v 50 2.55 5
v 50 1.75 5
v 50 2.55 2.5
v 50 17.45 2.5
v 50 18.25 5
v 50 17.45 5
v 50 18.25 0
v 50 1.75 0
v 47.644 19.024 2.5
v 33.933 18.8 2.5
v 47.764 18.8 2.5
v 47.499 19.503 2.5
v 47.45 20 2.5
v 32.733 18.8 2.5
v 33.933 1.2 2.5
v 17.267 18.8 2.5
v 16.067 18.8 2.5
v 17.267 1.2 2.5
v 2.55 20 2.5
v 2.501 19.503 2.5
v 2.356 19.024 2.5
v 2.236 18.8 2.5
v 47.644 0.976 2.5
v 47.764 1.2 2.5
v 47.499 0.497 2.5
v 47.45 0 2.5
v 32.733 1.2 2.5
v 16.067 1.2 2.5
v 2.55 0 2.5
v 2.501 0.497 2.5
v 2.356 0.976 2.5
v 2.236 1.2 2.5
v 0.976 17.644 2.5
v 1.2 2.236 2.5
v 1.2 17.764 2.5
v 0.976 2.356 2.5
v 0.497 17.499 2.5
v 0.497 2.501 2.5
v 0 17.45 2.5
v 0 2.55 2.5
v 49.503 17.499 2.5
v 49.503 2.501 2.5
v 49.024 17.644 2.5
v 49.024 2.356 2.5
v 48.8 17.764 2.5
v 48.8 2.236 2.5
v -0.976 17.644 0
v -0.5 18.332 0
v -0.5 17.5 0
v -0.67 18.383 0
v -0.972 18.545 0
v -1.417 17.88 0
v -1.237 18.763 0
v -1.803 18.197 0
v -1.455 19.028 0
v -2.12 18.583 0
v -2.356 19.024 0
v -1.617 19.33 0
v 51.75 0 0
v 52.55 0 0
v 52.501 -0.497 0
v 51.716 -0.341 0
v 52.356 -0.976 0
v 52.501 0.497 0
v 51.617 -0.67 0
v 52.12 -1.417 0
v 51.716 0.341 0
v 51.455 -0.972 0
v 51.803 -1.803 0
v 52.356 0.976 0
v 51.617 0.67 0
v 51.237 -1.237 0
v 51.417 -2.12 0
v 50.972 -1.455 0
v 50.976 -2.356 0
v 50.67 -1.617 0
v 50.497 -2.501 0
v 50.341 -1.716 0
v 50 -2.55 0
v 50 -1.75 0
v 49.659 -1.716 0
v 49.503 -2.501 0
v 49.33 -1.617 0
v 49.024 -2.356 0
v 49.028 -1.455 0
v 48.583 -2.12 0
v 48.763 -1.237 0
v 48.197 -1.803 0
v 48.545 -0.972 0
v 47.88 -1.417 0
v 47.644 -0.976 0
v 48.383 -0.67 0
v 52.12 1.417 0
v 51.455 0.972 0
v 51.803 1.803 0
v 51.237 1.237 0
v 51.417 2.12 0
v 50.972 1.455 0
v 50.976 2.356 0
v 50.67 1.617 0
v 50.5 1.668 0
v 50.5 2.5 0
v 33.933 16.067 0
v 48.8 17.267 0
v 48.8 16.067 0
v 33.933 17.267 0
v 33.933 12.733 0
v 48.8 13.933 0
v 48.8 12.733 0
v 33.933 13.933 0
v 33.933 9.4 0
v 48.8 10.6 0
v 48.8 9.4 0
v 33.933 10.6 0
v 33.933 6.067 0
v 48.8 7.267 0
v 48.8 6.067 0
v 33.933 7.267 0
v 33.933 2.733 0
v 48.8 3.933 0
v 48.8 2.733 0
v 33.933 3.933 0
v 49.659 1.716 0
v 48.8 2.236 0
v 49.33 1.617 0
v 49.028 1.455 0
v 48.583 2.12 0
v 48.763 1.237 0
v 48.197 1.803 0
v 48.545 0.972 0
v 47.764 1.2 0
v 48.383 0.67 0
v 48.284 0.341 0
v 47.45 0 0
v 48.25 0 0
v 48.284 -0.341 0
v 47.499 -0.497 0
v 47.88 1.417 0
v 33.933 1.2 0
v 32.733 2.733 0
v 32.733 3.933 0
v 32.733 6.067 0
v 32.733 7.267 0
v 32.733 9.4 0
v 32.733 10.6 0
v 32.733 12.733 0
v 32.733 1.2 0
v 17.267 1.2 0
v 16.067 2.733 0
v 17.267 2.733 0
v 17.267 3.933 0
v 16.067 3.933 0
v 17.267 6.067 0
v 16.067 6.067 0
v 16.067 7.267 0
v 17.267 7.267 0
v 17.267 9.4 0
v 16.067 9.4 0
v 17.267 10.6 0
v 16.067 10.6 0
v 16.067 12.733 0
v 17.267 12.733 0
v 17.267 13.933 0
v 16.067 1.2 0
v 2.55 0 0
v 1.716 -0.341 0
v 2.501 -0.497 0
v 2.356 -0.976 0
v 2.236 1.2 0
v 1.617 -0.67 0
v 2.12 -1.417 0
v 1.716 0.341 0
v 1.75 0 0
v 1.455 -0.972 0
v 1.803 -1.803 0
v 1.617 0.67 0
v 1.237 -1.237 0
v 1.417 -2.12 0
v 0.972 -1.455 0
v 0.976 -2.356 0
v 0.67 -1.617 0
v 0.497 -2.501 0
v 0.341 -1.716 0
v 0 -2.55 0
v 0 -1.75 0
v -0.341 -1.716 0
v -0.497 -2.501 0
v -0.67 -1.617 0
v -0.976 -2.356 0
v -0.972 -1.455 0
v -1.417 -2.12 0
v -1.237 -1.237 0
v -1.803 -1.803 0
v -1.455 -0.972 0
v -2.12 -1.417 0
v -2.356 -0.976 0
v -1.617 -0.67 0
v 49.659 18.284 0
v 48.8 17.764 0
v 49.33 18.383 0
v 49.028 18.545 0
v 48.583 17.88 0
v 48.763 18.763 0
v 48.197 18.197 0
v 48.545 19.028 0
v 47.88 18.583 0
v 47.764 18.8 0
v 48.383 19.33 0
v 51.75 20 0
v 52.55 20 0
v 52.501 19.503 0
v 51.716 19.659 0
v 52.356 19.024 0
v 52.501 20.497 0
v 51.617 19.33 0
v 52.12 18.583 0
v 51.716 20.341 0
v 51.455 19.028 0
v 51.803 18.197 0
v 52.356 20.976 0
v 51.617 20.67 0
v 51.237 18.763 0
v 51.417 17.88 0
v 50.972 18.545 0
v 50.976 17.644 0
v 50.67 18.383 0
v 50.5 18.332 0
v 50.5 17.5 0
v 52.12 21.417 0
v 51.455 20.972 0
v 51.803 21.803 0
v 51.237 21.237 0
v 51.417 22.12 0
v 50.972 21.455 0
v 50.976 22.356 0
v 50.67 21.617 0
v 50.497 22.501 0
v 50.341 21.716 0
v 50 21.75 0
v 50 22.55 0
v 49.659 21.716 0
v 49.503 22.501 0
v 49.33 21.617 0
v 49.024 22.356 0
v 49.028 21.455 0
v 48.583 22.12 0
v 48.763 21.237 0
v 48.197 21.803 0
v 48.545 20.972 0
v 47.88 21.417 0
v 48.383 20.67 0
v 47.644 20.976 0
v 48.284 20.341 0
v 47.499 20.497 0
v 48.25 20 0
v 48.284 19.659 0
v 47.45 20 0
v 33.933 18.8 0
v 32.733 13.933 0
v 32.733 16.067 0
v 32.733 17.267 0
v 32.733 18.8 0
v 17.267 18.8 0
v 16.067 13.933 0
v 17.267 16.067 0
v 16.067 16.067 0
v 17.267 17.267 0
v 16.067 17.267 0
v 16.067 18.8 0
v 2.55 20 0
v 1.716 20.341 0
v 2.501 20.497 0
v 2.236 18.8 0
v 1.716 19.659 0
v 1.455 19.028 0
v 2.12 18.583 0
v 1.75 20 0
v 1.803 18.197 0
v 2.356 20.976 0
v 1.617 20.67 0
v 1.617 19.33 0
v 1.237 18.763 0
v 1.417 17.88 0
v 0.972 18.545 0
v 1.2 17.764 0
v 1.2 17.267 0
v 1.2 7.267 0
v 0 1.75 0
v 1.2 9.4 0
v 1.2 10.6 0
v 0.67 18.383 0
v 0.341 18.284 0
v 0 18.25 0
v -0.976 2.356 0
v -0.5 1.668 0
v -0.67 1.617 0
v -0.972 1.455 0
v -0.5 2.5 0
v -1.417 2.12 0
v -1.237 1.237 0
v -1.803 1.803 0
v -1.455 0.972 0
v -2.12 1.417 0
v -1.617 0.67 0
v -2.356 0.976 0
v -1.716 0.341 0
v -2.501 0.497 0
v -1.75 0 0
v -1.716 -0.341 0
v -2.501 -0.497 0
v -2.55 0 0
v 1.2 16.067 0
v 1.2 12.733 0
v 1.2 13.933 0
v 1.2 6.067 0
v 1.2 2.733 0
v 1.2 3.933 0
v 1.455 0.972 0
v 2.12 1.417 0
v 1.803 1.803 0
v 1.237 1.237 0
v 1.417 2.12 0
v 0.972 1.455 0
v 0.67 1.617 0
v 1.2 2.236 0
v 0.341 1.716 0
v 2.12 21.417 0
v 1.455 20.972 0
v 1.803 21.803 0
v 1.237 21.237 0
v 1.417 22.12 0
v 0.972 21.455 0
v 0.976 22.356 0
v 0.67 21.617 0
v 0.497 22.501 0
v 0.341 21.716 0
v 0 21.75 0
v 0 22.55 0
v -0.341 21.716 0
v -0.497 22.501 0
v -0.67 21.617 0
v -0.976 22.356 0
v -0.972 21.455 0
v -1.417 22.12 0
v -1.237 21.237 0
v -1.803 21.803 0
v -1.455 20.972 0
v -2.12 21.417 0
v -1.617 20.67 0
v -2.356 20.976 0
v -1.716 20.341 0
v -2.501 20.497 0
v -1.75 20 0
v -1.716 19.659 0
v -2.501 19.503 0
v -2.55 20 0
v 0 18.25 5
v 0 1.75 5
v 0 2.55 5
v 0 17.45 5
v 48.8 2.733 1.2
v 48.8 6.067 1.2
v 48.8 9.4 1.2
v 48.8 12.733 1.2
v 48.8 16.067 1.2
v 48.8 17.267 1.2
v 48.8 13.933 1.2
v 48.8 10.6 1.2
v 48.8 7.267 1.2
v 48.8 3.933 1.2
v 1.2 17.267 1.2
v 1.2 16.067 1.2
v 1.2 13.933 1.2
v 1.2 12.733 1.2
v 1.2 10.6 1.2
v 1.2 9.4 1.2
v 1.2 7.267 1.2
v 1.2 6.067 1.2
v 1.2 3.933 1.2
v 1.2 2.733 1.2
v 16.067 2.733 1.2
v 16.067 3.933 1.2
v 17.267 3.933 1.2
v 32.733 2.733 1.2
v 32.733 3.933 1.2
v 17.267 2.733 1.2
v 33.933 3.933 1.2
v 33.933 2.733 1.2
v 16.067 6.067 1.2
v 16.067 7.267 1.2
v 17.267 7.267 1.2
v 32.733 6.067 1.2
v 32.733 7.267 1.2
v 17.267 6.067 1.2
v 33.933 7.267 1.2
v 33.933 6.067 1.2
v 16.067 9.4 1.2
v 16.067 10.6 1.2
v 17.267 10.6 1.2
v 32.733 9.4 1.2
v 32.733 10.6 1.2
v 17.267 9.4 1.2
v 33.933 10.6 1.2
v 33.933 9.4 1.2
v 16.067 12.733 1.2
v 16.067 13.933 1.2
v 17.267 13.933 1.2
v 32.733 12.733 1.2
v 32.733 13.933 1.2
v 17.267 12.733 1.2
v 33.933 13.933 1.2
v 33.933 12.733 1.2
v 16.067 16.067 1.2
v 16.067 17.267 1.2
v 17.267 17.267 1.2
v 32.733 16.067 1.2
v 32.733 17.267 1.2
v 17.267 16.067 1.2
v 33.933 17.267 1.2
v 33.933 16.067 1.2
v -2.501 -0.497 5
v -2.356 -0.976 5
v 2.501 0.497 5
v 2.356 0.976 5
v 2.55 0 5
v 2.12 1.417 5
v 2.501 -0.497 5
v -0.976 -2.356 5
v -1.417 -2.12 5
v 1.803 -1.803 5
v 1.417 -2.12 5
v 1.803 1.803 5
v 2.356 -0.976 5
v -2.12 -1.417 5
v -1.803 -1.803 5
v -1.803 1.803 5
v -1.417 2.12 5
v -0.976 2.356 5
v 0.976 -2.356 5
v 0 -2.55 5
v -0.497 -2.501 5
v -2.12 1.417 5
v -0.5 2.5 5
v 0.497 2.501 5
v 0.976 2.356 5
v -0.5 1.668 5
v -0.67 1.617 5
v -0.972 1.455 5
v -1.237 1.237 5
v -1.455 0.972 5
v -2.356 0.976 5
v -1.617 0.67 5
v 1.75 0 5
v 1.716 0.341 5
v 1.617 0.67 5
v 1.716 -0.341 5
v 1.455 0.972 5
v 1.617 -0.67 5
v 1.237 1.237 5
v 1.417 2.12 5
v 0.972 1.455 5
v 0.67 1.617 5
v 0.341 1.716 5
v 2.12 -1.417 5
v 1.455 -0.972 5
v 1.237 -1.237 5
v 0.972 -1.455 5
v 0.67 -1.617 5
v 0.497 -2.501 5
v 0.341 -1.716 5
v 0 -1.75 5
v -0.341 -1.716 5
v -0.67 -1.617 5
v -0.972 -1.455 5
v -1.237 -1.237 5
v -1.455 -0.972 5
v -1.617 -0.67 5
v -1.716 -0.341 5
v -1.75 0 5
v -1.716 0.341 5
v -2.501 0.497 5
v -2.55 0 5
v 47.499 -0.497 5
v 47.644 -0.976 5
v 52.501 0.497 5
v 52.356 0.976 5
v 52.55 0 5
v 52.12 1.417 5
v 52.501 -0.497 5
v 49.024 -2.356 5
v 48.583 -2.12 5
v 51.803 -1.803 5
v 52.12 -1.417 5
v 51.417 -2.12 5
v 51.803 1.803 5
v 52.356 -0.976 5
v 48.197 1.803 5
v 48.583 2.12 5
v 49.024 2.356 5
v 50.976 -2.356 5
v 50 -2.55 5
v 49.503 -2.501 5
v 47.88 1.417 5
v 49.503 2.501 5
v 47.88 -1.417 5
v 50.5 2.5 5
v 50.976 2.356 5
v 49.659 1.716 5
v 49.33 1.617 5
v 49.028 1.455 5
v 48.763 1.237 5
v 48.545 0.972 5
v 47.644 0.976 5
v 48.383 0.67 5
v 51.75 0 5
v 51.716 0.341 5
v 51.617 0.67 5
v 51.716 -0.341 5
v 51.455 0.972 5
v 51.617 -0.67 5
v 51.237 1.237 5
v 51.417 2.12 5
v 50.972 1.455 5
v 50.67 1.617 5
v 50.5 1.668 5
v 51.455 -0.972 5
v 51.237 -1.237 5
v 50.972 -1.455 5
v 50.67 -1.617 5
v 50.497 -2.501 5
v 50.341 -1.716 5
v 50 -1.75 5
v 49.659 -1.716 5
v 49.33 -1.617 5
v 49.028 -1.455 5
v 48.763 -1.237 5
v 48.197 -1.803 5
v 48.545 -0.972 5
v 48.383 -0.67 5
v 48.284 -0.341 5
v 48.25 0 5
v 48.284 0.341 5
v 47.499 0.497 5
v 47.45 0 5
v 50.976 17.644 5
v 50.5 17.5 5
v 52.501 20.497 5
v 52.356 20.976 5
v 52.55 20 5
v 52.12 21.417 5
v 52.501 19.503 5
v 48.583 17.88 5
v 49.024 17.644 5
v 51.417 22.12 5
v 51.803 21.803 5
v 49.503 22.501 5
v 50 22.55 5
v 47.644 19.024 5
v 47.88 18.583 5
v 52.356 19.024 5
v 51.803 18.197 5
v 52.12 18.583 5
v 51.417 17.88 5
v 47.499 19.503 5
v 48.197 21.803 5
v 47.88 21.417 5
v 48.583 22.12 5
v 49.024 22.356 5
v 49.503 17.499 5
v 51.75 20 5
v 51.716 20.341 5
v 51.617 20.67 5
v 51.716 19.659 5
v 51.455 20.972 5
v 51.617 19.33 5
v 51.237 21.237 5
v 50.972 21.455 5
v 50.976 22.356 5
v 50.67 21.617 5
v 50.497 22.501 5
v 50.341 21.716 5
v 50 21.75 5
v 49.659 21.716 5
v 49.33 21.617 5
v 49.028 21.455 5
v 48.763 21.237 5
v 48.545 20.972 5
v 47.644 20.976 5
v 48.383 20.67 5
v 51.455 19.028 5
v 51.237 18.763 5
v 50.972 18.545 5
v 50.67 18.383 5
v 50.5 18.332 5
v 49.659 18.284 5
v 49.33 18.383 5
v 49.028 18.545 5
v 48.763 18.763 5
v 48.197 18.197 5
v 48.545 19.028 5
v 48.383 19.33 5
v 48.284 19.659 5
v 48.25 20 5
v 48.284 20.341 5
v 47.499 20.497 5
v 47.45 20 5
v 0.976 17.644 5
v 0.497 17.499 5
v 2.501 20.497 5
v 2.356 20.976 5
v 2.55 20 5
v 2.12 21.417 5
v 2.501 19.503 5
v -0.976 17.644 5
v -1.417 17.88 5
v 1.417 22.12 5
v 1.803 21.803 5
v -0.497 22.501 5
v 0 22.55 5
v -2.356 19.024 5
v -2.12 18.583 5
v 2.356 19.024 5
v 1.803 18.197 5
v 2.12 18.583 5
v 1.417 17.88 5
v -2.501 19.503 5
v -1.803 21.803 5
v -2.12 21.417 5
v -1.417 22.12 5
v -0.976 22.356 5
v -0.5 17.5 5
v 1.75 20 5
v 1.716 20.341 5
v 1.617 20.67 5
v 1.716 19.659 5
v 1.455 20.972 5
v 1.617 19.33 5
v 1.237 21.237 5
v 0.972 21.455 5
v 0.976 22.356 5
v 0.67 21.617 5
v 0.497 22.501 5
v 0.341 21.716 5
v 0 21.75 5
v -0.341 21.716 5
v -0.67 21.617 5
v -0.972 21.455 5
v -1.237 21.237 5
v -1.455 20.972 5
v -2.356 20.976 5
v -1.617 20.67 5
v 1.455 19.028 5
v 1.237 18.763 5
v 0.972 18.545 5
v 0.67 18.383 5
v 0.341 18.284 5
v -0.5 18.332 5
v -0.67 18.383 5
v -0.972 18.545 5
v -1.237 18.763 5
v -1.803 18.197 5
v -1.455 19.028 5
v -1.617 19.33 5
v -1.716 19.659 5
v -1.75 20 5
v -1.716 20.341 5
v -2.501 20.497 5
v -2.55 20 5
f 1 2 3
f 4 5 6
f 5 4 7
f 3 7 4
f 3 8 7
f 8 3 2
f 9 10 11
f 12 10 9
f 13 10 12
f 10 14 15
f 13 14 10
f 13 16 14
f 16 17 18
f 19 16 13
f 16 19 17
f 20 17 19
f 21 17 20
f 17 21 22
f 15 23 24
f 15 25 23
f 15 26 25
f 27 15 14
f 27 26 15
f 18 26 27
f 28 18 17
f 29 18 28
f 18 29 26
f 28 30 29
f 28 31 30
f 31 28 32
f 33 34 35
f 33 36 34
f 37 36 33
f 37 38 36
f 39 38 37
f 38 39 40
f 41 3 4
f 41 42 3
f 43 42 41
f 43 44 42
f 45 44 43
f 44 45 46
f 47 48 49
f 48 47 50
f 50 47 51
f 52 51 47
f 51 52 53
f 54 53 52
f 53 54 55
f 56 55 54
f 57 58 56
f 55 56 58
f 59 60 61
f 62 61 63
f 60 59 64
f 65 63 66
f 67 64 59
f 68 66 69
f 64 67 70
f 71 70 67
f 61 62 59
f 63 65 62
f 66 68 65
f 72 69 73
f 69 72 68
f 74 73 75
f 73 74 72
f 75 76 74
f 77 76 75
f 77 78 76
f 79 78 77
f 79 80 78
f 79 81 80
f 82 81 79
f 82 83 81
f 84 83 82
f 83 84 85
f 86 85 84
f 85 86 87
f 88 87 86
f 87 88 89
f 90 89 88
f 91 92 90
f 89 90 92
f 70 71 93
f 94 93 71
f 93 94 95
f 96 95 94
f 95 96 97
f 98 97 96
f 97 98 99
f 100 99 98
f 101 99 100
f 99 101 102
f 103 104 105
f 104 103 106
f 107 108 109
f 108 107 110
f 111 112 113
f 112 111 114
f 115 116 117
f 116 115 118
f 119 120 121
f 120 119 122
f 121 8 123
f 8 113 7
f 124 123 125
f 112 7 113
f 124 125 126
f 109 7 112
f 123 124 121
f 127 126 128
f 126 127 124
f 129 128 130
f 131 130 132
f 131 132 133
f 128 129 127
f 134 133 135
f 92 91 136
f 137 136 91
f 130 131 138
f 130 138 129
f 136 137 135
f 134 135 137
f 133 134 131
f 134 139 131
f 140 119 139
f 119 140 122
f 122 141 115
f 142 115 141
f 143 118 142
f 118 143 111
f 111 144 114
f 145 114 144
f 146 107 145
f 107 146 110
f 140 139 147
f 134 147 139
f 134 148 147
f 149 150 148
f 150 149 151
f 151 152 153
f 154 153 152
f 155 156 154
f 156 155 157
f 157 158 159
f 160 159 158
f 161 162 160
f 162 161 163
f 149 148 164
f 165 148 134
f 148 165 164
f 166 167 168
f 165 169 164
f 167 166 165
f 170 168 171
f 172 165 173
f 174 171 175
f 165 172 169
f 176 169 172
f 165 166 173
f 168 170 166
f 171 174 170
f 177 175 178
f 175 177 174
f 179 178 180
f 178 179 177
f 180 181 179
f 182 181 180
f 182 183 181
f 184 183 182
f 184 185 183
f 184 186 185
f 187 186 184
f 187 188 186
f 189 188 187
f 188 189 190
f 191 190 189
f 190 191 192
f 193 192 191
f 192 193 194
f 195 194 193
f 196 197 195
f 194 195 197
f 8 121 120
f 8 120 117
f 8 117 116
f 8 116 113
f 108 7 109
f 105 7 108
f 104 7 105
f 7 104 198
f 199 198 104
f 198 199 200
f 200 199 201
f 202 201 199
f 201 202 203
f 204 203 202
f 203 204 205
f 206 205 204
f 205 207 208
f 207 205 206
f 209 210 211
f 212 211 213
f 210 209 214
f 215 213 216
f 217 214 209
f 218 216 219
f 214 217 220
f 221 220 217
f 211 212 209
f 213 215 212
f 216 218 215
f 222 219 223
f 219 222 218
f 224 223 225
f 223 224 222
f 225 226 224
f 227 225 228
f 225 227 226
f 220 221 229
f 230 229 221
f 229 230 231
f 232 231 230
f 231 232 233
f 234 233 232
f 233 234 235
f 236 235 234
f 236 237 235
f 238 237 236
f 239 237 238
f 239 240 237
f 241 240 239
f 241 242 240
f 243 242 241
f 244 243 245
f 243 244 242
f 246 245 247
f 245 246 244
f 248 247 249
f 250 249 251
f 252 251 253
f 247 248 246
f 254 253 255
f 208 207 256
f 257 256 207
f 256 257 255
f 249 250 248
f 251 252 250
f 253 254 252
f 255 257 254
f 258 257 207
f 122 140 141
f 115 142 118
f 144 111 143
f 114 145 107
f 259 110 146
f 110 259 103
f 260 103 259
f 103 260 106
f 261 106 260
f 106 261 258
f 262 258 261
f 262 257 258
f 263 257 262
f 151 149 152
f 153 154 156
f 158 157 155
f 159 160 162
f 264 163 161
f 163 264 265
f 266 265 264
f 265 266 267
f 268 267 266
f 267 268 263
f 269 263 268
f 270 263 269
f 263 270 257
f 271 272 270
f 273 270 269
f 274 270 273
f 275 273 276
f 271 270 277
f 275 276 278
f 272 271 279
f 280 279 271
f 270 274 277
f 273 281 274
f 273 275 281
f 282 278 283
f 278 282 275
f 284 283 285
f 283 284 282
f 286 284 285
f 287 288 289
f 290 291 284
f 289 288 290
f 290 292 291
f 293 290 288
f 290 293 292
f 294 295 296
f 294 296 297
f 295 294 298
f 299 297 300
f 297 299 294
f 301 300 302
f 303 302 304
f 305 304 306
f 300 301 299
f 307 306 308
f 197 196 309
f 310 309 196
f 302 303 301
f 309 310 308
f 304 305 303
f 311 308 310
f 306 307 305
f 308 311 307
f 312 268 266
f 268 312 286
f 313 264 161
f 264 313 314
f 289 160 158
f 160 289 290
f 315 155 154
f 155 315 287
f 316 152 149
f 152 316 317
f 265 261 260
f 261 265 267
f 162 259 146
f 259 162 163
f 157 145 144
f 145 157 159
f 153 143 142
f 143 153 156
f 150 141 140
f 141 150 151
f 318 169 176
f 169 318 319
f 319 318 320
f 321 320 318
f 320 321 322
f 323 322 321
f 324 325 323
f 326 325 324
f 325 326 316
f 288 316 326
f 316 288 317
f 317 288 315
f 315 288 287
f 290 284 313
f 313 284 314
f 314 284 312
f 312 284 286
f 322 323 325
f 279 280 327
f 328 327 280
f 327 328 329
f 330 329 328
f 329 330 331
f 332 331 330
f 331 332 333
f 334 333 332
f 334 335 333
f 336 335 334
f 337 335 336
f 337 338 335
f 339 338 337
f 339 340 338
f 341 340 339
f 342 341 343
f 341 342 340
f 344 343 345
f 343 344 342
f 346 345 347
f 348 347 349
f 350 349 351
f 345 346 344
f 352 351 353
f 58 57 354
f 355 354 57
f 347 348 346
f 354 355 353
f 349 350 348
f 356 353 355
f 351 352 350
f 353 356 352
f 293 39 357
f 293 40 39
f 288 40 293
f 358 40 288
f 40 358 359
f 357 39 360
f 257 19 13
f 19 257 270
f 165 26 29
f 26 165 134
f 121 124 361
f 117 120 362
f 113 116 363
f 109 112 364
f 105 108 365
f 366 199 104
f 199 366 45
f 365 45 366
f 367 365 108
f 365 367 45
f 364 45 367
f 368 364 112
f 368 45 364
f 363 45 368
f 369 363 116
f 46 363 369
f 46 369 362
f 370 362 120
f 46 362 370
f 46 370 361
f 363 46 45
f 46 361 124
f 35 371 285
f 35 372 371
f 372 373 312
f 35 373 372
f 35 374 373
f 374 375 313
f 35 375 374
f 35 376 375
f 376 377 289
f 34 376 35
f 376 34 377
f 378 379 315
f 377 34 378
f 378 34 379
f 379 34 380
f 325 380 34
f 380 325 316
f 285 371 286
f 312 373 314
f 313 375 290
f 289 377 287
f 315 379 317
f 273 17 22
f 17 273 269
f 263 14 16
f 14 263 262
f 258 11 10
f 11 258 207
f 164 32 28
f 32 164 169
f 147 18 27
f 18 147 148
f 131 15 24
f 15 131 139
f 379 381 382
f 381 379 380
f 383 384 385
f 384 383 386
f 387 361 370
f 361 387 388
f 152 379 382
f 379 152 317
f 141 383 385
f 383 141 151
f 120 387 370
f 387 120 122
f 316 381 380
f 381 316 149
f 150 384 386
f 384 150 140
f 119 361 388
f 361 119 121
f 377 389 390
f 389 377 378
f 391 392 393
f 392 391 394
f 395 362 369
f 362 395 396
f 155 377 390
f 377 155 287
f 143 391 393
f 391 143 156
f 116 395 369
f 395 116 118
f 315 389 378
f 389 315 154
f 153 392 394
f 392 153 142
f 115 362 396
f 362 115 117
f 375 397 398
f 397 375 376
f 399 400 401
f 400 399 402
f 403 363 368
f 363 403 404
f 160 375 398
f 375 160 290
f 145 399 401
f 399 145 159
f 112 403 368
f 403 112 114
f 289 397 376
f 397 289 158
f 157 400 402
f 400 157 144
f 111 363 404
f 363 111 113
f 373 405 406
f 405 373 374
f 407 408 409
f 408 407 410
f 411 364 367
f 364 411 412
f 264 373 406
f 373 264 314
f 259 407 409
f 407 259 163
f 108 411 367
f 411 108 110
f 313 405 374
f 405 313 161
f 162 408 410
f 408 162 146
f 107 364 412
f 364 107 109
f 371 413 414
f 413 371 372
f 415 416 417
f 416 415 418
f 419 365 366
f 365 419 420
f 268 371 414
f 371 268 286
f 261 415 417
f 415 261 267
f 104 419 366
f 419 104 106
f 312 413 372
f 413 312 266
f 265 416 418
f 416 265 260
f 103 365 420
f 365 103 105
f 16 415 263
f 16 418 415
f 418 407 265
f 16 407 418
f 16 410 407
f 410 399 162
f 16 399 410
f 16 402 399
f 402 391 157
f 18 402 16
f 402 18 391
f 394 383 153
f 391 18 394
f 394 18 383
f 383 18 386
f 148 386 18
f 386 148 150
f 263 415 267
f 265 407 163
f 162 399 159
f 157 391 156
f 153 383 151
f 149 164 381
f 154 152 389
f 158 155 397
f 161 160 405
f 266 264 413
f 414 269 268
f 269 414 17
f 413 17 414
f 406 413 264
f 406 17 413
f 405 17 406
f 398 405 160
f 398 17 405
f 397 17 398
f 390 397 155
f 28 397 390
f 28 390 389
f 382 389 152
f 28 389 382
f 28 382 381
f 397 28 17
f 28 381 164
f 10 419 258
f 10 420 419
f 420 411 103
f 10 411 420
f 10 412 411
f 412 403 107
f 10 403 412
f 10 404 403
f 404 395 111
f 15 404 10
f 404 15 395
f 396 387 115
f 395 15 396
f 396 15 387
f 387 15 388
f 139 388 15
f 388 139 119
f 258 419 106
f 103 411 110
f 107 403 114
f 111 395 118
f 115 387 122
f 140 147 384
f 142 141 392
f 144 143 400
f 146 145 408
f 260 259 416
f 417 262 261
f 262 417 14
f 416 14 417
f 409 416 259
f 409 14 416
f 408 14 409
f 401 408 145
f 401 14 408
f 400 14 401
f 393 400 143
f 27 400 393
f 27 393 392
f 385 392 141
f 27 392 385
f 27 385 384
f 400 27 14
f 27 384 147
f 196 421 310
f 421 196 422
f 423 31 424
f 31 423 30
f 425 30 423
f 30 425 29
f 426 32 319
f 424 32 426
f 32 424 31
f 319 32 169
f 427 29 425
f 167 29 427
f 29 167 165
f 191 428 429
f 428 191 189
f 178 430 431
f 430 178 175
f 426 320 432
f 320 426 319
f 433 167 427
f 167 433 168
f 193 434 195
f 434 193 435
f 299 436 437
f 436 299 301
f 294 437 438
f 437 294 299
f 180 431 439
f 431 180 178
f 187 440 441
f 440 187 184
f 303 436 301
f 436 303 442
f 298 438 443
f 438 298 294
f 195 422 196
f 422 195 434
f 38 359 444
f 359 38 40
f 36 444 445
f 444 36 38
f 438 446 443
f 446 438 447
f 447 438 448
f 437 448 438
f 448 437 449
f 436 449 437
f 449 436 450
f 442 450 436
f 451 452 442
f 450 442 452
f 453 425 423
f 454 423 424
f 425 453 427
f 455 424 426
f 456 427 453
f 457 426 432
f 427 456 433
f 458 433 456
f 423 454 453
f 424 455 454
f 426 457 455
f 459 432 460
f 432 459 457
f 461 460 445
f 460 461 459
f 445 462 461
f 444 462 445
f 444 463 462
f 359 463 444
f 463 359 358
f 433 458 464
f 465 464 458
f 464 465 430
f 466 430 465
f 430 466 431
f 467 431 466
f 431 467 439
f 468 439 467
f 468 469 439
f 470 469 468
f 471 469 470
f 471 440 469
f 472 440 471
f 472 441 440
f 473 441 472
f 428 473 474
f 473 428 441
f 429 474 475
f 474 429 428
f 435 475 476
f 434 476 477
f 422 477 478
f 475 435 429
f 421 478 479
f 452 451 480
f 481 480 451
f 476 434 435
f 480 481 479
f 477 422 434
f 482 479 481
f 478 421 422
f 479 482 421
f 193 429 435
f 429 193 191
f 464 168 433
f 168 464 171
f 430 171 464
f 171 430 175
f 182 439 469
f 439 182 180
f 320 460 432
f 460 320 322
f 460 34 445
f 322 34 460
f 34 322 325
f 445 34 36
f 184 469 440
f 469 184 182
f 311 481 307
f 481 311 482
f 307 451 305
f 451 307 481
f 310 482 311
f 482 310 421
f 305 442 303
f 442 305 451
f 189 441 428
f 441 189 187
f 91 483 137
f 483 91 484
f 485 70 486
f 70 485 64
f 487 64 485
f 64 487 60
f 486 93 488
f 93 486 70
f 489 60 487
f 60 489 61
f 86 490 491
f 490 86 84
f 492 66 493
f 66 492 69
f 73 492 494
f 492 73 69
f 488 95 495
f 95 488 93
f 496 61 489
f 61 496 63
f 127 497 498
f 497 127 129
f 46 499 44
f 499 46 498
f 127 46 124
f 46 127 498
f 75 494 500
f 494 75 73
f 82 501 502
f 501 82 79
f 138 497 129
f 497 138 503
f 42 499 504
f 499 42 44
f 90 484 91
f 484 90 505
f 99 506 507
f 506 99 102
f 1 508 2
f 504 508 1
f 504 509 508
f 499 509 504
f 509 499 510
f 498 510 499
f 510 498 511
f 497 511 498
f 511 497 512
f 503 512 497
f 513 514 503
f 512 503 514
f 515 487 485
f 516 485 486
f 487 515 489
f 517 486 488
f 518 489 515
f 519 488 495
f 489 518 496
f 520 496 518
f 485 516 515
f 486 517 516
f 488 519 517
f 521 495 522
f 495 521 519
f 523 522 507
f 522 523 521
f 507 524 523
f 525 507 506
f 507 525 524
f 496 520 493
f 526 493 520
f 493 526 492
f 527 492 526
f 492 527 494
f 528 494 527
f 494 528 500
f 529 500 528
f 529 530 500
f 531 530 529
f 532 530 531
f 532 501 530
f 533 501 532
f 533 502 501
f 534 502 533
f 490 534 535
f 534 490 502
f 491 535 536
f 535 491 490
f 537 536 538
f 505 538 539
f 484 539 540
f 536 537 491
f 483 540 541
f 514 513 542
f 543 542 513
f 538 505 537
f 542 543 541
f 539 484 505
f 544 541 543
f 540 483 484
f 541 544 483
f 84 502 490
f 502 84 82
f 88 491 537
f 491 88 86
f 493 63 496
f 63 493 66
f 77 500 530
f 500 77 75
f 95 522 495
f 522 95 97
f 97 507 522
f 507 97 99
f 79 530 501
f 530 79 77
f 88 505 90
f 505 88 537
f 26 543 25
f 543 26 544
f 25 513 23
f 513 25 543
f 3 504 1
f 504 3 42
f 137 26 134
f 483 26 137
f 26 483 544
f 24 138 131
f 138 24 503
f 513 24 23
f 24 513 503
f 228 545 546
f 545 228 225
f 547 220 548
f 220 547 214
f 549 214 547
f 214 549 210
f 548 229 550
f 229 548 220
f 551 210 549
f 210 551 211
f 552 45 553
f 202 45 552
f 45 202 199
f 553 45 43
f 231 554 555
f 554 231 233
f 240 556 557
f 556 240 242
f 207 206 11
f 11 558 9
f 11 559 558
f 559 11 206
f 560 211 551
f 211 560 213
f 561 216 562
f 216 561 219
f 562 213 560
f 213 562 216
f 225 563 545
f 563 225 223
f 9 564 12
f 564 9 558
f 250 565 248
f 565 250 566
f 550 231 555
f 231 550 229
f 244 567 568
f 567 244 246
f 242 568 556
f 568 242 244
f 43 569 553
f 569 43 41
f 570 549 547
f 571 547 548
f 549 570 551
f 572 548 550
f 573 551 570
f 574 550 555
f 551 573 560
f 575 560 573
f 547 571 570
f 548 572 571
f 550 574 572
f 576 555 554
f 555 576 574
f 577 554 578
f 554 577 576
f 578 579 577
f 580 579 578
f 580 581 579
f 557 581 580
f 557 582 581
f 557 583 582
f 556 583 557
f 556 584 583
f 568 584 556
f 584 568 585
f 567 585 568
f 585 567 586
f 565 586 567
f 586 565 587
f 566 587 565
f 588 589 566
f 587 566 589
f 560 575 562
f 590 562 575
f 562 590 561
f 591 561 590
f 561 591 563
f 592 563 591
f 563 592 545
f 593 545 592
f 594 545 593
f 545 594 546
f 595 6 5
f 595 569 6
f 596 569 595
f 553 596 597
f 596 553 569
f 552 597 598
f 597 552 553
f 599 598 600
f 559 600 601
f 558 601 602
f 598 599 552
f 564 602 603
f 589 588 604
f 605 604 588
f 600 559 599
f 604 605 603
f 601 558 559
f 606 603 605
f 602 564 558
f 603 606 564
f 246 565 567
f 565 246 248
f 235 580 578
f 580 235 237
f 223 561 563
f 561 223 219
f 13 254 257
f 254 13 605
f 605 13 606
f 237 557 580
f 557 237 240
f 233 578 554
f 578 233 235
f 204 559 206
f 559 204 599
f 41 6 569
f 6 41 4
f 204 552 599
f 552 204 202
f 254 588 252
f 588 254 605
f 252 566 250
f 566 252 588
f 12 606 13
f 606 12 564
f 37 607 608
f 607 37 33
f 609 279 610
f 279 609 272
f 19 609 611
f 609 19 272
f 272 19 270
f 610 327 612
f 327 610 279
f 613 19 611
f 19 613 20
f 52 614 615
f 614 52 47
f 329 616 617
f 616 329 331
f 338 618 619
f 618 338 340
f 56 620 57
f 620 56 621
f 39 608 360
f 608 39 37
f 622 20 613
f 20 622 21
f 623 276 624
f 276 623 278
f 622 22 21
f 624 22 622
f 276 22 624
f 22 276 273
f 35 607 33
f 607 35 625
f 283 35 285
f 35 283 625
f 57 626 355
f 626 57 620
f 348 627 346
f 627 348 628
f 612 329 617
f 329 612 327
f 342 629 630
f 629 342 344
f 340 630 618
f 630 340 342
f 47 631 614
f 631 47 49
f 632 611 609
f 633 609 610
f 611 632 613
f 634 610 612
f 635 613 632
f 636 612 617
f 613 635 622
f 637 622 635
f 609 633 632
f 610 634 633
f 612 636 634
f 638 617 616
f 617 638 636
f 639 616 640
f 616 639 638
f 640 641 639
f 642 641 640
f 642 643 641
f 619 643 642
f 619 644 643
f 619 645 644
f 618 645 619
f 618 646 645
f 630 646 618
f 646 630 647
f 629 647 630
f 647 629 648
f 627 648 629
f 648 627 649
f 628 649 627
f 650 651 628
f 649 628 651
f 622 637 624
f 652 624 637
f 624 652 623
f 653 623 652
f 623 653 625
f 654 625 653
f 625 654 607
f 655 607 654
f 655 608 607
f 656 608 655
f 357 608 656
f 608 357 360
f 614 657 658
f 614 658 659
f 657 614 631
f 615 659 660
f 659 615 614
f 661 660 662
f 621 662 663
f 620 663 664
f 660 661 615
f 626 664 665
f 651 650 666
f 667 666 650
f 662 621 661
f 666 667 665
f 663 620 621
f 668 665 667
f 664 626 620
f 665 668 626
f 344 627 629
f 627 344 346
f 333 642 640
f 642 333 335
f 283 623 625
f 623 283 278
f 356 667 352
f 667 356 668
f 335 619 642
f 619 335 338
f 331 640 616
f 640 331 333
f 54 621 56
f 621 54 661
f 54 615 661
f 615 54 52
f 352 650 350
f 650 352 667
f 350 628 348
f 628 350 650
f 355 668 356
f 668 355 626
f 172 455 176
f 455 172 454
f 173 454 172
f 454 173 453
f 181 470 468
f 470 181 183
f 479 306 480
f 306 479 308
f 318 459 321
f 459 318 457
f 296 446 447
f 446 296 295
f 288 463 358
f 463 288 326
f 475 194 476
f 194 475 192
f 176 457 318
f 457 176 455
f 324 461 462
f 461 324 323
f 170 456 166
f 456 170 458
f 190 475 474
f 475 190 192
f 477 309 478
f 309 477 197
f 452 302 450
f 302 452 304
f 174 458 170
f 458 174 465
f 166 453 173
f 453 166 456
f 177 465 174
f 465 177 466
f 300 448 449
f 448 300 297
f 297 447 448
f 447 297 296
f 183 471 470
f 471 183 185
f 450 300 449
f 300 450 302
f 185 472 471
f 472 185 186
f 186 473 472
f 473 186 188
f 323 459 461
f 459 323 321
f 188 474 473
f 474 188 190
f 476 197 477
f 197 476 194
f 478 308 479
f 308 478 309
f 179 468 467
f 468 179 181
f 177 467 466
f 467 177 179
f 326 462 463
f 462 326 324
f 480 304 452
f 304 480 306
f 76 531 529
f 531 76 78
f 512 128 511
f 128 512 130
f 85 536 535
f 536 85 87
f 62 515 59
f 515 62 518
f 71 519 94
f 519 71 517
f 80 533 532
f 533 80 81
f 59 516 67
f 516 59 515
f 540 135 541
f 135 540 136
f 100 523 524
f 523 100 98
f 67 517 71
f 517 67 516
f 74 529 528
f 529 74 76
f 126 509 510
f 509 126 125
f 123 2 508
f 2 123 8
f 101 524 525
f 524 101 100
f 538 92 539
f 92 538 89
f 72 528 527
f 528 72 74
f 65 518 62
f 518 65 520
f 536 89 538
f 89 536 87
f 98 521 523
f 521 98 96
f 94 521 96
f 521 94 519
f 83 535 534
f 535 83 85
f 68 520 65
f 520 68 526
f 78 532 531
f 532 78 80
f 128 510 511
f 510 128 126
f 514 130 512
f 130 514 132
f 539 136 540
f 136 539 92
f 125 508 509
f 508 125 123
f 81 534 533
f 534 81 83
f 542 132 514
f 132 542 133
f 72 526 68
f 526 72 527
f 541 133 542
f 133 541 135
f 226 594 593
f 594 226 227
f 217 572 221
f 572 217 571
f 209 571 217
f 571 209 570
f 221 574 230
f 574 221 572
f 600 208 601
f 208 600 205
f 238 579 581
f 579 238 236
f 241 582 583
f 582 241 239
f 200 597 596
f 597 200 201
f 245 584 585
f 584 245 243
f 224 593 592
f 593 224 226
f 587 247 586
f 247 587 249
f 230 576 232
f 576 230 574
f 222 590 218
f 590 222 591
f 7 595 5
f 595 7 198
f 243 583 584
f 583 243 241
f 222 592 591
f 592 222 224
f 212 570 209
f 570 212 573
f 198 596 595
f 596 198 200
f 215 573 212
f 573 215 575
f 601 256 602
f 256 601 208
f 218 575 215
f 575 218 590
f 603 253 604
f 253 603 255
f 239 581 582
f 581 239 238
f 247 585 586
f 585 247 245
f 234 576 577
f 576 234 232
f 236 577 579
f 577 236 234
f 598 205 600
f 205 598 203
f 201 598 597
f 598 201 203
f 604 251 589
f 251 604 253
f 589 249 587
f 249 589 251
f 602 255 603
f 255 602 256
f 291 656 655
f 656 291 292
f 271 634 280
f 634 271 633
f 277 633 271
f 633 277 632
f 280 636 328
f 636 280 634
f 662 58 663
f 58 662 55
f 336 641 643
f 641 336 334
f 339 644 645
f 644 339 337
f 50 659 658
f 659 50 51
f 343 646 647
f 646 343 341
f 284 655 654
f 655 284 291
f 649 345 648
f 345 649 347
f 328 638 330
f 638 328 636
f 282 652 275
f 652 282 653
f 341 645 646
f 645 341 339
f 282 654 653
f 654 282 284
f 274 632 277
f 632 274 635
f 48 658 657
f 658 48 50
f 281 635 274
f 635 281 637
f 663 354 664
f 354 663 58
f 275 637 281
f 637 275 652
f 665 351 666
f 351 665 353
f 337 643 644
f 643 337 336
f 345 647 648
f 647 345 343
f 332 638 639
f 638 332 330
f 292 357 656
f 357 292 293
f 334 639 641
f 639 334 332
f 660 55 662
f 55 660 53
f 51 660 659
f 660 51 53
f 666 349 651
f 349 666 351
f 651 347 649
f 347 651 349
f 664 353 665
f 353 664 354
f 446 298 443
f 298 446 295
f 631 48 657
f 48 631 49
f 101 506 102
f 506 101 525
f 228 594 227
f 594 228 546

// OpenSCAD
/* [Parameters] */

width = 50;
depth = 20;
numShelves = 1;

/* [Hidden] */
postRadius = 1.5;
wireSize = 1.2;
wireGap = 2;
splitGap = 0.5;

shelfH = 5;

wallThick = 0.8;
clearanceR = 0.25;

outerR = postRadius + wallThick + clearanceR;
innerR = postRadius + clearanceR;

$fn = 32;

module shelf(w, d) {
    
    difference() {
    difference() {
    difference() {
    union() {
        difference() {
            cube([w,d,shelfH/2]);
            translate([wireSize, wireSize, -shelfH/2])
            cube([w-wireSize*2, d-wireSize*2, shelfH*2]);
        }
        
        numWires = floor(d / (wireSize + wireGap));
        
        wireSpaceD = (d / numWires);
        
        for (i=[1:numWires-1]) {
        
            translate([0, i*wireSpaceD - (wireSize/2), 0])    
            cube([w, wireSize, wireSize]);
            
        }
        
        if ((w / d) > 1.25) {
            
            numReinforce = floor(w/d);
            reinforceGap = w / (numReinforce + 1);
            
            for (i=[1:numReinforce]) {
                translate([i*reinforceGap-wireSize/2, 0, 0])
                cube([wireSize, d, shelfH/2]);
            }
        }
        
        translate([0,0,0])
        cylinder(r=outerR, h=shelfH);

        translate([w,0,0])
        cylinder(r=outerR, h=shelfH);

        translate([w,d,0])
        cylinder(r=outerR, h=shelfH);

        translate([0,d,0])
        cylinder(r=outerR, h=shelfH);
    }
    
    
    union() {
        translate([0,0,-shelfH/2])
        cylinder(r=innerR, h=shelfH*2);

        translate([w,0,-shelfH/2])
        cylinder(r=innerR, h=shelfH*2);

        translate([w,d,-shelfH/2])
        cylinder(r=innerR, h=shelfH*2);

        translate([0,d,-shelfH/2])
        cylinder(r=innerR, h=shelfH*2);
    
        translate([-w/2, -d/2, -shelfH/4-2])
        cube([w*2, d*2, 2]);
    }
}

    translate([-splitGap,0,-shelfH/2])
    cube([splitGap, d, shelfH*2]);
    }
    translate([w,0,-shelfH/2])
    cube([splitGap, d, shelfH*2]);
}
}


for (i=[0:numShelves-1]) {
    translate([0, i * (depth + 10),0])
    shelf(width, depth);
}


// cylinder(r=postRadius, h=50);
